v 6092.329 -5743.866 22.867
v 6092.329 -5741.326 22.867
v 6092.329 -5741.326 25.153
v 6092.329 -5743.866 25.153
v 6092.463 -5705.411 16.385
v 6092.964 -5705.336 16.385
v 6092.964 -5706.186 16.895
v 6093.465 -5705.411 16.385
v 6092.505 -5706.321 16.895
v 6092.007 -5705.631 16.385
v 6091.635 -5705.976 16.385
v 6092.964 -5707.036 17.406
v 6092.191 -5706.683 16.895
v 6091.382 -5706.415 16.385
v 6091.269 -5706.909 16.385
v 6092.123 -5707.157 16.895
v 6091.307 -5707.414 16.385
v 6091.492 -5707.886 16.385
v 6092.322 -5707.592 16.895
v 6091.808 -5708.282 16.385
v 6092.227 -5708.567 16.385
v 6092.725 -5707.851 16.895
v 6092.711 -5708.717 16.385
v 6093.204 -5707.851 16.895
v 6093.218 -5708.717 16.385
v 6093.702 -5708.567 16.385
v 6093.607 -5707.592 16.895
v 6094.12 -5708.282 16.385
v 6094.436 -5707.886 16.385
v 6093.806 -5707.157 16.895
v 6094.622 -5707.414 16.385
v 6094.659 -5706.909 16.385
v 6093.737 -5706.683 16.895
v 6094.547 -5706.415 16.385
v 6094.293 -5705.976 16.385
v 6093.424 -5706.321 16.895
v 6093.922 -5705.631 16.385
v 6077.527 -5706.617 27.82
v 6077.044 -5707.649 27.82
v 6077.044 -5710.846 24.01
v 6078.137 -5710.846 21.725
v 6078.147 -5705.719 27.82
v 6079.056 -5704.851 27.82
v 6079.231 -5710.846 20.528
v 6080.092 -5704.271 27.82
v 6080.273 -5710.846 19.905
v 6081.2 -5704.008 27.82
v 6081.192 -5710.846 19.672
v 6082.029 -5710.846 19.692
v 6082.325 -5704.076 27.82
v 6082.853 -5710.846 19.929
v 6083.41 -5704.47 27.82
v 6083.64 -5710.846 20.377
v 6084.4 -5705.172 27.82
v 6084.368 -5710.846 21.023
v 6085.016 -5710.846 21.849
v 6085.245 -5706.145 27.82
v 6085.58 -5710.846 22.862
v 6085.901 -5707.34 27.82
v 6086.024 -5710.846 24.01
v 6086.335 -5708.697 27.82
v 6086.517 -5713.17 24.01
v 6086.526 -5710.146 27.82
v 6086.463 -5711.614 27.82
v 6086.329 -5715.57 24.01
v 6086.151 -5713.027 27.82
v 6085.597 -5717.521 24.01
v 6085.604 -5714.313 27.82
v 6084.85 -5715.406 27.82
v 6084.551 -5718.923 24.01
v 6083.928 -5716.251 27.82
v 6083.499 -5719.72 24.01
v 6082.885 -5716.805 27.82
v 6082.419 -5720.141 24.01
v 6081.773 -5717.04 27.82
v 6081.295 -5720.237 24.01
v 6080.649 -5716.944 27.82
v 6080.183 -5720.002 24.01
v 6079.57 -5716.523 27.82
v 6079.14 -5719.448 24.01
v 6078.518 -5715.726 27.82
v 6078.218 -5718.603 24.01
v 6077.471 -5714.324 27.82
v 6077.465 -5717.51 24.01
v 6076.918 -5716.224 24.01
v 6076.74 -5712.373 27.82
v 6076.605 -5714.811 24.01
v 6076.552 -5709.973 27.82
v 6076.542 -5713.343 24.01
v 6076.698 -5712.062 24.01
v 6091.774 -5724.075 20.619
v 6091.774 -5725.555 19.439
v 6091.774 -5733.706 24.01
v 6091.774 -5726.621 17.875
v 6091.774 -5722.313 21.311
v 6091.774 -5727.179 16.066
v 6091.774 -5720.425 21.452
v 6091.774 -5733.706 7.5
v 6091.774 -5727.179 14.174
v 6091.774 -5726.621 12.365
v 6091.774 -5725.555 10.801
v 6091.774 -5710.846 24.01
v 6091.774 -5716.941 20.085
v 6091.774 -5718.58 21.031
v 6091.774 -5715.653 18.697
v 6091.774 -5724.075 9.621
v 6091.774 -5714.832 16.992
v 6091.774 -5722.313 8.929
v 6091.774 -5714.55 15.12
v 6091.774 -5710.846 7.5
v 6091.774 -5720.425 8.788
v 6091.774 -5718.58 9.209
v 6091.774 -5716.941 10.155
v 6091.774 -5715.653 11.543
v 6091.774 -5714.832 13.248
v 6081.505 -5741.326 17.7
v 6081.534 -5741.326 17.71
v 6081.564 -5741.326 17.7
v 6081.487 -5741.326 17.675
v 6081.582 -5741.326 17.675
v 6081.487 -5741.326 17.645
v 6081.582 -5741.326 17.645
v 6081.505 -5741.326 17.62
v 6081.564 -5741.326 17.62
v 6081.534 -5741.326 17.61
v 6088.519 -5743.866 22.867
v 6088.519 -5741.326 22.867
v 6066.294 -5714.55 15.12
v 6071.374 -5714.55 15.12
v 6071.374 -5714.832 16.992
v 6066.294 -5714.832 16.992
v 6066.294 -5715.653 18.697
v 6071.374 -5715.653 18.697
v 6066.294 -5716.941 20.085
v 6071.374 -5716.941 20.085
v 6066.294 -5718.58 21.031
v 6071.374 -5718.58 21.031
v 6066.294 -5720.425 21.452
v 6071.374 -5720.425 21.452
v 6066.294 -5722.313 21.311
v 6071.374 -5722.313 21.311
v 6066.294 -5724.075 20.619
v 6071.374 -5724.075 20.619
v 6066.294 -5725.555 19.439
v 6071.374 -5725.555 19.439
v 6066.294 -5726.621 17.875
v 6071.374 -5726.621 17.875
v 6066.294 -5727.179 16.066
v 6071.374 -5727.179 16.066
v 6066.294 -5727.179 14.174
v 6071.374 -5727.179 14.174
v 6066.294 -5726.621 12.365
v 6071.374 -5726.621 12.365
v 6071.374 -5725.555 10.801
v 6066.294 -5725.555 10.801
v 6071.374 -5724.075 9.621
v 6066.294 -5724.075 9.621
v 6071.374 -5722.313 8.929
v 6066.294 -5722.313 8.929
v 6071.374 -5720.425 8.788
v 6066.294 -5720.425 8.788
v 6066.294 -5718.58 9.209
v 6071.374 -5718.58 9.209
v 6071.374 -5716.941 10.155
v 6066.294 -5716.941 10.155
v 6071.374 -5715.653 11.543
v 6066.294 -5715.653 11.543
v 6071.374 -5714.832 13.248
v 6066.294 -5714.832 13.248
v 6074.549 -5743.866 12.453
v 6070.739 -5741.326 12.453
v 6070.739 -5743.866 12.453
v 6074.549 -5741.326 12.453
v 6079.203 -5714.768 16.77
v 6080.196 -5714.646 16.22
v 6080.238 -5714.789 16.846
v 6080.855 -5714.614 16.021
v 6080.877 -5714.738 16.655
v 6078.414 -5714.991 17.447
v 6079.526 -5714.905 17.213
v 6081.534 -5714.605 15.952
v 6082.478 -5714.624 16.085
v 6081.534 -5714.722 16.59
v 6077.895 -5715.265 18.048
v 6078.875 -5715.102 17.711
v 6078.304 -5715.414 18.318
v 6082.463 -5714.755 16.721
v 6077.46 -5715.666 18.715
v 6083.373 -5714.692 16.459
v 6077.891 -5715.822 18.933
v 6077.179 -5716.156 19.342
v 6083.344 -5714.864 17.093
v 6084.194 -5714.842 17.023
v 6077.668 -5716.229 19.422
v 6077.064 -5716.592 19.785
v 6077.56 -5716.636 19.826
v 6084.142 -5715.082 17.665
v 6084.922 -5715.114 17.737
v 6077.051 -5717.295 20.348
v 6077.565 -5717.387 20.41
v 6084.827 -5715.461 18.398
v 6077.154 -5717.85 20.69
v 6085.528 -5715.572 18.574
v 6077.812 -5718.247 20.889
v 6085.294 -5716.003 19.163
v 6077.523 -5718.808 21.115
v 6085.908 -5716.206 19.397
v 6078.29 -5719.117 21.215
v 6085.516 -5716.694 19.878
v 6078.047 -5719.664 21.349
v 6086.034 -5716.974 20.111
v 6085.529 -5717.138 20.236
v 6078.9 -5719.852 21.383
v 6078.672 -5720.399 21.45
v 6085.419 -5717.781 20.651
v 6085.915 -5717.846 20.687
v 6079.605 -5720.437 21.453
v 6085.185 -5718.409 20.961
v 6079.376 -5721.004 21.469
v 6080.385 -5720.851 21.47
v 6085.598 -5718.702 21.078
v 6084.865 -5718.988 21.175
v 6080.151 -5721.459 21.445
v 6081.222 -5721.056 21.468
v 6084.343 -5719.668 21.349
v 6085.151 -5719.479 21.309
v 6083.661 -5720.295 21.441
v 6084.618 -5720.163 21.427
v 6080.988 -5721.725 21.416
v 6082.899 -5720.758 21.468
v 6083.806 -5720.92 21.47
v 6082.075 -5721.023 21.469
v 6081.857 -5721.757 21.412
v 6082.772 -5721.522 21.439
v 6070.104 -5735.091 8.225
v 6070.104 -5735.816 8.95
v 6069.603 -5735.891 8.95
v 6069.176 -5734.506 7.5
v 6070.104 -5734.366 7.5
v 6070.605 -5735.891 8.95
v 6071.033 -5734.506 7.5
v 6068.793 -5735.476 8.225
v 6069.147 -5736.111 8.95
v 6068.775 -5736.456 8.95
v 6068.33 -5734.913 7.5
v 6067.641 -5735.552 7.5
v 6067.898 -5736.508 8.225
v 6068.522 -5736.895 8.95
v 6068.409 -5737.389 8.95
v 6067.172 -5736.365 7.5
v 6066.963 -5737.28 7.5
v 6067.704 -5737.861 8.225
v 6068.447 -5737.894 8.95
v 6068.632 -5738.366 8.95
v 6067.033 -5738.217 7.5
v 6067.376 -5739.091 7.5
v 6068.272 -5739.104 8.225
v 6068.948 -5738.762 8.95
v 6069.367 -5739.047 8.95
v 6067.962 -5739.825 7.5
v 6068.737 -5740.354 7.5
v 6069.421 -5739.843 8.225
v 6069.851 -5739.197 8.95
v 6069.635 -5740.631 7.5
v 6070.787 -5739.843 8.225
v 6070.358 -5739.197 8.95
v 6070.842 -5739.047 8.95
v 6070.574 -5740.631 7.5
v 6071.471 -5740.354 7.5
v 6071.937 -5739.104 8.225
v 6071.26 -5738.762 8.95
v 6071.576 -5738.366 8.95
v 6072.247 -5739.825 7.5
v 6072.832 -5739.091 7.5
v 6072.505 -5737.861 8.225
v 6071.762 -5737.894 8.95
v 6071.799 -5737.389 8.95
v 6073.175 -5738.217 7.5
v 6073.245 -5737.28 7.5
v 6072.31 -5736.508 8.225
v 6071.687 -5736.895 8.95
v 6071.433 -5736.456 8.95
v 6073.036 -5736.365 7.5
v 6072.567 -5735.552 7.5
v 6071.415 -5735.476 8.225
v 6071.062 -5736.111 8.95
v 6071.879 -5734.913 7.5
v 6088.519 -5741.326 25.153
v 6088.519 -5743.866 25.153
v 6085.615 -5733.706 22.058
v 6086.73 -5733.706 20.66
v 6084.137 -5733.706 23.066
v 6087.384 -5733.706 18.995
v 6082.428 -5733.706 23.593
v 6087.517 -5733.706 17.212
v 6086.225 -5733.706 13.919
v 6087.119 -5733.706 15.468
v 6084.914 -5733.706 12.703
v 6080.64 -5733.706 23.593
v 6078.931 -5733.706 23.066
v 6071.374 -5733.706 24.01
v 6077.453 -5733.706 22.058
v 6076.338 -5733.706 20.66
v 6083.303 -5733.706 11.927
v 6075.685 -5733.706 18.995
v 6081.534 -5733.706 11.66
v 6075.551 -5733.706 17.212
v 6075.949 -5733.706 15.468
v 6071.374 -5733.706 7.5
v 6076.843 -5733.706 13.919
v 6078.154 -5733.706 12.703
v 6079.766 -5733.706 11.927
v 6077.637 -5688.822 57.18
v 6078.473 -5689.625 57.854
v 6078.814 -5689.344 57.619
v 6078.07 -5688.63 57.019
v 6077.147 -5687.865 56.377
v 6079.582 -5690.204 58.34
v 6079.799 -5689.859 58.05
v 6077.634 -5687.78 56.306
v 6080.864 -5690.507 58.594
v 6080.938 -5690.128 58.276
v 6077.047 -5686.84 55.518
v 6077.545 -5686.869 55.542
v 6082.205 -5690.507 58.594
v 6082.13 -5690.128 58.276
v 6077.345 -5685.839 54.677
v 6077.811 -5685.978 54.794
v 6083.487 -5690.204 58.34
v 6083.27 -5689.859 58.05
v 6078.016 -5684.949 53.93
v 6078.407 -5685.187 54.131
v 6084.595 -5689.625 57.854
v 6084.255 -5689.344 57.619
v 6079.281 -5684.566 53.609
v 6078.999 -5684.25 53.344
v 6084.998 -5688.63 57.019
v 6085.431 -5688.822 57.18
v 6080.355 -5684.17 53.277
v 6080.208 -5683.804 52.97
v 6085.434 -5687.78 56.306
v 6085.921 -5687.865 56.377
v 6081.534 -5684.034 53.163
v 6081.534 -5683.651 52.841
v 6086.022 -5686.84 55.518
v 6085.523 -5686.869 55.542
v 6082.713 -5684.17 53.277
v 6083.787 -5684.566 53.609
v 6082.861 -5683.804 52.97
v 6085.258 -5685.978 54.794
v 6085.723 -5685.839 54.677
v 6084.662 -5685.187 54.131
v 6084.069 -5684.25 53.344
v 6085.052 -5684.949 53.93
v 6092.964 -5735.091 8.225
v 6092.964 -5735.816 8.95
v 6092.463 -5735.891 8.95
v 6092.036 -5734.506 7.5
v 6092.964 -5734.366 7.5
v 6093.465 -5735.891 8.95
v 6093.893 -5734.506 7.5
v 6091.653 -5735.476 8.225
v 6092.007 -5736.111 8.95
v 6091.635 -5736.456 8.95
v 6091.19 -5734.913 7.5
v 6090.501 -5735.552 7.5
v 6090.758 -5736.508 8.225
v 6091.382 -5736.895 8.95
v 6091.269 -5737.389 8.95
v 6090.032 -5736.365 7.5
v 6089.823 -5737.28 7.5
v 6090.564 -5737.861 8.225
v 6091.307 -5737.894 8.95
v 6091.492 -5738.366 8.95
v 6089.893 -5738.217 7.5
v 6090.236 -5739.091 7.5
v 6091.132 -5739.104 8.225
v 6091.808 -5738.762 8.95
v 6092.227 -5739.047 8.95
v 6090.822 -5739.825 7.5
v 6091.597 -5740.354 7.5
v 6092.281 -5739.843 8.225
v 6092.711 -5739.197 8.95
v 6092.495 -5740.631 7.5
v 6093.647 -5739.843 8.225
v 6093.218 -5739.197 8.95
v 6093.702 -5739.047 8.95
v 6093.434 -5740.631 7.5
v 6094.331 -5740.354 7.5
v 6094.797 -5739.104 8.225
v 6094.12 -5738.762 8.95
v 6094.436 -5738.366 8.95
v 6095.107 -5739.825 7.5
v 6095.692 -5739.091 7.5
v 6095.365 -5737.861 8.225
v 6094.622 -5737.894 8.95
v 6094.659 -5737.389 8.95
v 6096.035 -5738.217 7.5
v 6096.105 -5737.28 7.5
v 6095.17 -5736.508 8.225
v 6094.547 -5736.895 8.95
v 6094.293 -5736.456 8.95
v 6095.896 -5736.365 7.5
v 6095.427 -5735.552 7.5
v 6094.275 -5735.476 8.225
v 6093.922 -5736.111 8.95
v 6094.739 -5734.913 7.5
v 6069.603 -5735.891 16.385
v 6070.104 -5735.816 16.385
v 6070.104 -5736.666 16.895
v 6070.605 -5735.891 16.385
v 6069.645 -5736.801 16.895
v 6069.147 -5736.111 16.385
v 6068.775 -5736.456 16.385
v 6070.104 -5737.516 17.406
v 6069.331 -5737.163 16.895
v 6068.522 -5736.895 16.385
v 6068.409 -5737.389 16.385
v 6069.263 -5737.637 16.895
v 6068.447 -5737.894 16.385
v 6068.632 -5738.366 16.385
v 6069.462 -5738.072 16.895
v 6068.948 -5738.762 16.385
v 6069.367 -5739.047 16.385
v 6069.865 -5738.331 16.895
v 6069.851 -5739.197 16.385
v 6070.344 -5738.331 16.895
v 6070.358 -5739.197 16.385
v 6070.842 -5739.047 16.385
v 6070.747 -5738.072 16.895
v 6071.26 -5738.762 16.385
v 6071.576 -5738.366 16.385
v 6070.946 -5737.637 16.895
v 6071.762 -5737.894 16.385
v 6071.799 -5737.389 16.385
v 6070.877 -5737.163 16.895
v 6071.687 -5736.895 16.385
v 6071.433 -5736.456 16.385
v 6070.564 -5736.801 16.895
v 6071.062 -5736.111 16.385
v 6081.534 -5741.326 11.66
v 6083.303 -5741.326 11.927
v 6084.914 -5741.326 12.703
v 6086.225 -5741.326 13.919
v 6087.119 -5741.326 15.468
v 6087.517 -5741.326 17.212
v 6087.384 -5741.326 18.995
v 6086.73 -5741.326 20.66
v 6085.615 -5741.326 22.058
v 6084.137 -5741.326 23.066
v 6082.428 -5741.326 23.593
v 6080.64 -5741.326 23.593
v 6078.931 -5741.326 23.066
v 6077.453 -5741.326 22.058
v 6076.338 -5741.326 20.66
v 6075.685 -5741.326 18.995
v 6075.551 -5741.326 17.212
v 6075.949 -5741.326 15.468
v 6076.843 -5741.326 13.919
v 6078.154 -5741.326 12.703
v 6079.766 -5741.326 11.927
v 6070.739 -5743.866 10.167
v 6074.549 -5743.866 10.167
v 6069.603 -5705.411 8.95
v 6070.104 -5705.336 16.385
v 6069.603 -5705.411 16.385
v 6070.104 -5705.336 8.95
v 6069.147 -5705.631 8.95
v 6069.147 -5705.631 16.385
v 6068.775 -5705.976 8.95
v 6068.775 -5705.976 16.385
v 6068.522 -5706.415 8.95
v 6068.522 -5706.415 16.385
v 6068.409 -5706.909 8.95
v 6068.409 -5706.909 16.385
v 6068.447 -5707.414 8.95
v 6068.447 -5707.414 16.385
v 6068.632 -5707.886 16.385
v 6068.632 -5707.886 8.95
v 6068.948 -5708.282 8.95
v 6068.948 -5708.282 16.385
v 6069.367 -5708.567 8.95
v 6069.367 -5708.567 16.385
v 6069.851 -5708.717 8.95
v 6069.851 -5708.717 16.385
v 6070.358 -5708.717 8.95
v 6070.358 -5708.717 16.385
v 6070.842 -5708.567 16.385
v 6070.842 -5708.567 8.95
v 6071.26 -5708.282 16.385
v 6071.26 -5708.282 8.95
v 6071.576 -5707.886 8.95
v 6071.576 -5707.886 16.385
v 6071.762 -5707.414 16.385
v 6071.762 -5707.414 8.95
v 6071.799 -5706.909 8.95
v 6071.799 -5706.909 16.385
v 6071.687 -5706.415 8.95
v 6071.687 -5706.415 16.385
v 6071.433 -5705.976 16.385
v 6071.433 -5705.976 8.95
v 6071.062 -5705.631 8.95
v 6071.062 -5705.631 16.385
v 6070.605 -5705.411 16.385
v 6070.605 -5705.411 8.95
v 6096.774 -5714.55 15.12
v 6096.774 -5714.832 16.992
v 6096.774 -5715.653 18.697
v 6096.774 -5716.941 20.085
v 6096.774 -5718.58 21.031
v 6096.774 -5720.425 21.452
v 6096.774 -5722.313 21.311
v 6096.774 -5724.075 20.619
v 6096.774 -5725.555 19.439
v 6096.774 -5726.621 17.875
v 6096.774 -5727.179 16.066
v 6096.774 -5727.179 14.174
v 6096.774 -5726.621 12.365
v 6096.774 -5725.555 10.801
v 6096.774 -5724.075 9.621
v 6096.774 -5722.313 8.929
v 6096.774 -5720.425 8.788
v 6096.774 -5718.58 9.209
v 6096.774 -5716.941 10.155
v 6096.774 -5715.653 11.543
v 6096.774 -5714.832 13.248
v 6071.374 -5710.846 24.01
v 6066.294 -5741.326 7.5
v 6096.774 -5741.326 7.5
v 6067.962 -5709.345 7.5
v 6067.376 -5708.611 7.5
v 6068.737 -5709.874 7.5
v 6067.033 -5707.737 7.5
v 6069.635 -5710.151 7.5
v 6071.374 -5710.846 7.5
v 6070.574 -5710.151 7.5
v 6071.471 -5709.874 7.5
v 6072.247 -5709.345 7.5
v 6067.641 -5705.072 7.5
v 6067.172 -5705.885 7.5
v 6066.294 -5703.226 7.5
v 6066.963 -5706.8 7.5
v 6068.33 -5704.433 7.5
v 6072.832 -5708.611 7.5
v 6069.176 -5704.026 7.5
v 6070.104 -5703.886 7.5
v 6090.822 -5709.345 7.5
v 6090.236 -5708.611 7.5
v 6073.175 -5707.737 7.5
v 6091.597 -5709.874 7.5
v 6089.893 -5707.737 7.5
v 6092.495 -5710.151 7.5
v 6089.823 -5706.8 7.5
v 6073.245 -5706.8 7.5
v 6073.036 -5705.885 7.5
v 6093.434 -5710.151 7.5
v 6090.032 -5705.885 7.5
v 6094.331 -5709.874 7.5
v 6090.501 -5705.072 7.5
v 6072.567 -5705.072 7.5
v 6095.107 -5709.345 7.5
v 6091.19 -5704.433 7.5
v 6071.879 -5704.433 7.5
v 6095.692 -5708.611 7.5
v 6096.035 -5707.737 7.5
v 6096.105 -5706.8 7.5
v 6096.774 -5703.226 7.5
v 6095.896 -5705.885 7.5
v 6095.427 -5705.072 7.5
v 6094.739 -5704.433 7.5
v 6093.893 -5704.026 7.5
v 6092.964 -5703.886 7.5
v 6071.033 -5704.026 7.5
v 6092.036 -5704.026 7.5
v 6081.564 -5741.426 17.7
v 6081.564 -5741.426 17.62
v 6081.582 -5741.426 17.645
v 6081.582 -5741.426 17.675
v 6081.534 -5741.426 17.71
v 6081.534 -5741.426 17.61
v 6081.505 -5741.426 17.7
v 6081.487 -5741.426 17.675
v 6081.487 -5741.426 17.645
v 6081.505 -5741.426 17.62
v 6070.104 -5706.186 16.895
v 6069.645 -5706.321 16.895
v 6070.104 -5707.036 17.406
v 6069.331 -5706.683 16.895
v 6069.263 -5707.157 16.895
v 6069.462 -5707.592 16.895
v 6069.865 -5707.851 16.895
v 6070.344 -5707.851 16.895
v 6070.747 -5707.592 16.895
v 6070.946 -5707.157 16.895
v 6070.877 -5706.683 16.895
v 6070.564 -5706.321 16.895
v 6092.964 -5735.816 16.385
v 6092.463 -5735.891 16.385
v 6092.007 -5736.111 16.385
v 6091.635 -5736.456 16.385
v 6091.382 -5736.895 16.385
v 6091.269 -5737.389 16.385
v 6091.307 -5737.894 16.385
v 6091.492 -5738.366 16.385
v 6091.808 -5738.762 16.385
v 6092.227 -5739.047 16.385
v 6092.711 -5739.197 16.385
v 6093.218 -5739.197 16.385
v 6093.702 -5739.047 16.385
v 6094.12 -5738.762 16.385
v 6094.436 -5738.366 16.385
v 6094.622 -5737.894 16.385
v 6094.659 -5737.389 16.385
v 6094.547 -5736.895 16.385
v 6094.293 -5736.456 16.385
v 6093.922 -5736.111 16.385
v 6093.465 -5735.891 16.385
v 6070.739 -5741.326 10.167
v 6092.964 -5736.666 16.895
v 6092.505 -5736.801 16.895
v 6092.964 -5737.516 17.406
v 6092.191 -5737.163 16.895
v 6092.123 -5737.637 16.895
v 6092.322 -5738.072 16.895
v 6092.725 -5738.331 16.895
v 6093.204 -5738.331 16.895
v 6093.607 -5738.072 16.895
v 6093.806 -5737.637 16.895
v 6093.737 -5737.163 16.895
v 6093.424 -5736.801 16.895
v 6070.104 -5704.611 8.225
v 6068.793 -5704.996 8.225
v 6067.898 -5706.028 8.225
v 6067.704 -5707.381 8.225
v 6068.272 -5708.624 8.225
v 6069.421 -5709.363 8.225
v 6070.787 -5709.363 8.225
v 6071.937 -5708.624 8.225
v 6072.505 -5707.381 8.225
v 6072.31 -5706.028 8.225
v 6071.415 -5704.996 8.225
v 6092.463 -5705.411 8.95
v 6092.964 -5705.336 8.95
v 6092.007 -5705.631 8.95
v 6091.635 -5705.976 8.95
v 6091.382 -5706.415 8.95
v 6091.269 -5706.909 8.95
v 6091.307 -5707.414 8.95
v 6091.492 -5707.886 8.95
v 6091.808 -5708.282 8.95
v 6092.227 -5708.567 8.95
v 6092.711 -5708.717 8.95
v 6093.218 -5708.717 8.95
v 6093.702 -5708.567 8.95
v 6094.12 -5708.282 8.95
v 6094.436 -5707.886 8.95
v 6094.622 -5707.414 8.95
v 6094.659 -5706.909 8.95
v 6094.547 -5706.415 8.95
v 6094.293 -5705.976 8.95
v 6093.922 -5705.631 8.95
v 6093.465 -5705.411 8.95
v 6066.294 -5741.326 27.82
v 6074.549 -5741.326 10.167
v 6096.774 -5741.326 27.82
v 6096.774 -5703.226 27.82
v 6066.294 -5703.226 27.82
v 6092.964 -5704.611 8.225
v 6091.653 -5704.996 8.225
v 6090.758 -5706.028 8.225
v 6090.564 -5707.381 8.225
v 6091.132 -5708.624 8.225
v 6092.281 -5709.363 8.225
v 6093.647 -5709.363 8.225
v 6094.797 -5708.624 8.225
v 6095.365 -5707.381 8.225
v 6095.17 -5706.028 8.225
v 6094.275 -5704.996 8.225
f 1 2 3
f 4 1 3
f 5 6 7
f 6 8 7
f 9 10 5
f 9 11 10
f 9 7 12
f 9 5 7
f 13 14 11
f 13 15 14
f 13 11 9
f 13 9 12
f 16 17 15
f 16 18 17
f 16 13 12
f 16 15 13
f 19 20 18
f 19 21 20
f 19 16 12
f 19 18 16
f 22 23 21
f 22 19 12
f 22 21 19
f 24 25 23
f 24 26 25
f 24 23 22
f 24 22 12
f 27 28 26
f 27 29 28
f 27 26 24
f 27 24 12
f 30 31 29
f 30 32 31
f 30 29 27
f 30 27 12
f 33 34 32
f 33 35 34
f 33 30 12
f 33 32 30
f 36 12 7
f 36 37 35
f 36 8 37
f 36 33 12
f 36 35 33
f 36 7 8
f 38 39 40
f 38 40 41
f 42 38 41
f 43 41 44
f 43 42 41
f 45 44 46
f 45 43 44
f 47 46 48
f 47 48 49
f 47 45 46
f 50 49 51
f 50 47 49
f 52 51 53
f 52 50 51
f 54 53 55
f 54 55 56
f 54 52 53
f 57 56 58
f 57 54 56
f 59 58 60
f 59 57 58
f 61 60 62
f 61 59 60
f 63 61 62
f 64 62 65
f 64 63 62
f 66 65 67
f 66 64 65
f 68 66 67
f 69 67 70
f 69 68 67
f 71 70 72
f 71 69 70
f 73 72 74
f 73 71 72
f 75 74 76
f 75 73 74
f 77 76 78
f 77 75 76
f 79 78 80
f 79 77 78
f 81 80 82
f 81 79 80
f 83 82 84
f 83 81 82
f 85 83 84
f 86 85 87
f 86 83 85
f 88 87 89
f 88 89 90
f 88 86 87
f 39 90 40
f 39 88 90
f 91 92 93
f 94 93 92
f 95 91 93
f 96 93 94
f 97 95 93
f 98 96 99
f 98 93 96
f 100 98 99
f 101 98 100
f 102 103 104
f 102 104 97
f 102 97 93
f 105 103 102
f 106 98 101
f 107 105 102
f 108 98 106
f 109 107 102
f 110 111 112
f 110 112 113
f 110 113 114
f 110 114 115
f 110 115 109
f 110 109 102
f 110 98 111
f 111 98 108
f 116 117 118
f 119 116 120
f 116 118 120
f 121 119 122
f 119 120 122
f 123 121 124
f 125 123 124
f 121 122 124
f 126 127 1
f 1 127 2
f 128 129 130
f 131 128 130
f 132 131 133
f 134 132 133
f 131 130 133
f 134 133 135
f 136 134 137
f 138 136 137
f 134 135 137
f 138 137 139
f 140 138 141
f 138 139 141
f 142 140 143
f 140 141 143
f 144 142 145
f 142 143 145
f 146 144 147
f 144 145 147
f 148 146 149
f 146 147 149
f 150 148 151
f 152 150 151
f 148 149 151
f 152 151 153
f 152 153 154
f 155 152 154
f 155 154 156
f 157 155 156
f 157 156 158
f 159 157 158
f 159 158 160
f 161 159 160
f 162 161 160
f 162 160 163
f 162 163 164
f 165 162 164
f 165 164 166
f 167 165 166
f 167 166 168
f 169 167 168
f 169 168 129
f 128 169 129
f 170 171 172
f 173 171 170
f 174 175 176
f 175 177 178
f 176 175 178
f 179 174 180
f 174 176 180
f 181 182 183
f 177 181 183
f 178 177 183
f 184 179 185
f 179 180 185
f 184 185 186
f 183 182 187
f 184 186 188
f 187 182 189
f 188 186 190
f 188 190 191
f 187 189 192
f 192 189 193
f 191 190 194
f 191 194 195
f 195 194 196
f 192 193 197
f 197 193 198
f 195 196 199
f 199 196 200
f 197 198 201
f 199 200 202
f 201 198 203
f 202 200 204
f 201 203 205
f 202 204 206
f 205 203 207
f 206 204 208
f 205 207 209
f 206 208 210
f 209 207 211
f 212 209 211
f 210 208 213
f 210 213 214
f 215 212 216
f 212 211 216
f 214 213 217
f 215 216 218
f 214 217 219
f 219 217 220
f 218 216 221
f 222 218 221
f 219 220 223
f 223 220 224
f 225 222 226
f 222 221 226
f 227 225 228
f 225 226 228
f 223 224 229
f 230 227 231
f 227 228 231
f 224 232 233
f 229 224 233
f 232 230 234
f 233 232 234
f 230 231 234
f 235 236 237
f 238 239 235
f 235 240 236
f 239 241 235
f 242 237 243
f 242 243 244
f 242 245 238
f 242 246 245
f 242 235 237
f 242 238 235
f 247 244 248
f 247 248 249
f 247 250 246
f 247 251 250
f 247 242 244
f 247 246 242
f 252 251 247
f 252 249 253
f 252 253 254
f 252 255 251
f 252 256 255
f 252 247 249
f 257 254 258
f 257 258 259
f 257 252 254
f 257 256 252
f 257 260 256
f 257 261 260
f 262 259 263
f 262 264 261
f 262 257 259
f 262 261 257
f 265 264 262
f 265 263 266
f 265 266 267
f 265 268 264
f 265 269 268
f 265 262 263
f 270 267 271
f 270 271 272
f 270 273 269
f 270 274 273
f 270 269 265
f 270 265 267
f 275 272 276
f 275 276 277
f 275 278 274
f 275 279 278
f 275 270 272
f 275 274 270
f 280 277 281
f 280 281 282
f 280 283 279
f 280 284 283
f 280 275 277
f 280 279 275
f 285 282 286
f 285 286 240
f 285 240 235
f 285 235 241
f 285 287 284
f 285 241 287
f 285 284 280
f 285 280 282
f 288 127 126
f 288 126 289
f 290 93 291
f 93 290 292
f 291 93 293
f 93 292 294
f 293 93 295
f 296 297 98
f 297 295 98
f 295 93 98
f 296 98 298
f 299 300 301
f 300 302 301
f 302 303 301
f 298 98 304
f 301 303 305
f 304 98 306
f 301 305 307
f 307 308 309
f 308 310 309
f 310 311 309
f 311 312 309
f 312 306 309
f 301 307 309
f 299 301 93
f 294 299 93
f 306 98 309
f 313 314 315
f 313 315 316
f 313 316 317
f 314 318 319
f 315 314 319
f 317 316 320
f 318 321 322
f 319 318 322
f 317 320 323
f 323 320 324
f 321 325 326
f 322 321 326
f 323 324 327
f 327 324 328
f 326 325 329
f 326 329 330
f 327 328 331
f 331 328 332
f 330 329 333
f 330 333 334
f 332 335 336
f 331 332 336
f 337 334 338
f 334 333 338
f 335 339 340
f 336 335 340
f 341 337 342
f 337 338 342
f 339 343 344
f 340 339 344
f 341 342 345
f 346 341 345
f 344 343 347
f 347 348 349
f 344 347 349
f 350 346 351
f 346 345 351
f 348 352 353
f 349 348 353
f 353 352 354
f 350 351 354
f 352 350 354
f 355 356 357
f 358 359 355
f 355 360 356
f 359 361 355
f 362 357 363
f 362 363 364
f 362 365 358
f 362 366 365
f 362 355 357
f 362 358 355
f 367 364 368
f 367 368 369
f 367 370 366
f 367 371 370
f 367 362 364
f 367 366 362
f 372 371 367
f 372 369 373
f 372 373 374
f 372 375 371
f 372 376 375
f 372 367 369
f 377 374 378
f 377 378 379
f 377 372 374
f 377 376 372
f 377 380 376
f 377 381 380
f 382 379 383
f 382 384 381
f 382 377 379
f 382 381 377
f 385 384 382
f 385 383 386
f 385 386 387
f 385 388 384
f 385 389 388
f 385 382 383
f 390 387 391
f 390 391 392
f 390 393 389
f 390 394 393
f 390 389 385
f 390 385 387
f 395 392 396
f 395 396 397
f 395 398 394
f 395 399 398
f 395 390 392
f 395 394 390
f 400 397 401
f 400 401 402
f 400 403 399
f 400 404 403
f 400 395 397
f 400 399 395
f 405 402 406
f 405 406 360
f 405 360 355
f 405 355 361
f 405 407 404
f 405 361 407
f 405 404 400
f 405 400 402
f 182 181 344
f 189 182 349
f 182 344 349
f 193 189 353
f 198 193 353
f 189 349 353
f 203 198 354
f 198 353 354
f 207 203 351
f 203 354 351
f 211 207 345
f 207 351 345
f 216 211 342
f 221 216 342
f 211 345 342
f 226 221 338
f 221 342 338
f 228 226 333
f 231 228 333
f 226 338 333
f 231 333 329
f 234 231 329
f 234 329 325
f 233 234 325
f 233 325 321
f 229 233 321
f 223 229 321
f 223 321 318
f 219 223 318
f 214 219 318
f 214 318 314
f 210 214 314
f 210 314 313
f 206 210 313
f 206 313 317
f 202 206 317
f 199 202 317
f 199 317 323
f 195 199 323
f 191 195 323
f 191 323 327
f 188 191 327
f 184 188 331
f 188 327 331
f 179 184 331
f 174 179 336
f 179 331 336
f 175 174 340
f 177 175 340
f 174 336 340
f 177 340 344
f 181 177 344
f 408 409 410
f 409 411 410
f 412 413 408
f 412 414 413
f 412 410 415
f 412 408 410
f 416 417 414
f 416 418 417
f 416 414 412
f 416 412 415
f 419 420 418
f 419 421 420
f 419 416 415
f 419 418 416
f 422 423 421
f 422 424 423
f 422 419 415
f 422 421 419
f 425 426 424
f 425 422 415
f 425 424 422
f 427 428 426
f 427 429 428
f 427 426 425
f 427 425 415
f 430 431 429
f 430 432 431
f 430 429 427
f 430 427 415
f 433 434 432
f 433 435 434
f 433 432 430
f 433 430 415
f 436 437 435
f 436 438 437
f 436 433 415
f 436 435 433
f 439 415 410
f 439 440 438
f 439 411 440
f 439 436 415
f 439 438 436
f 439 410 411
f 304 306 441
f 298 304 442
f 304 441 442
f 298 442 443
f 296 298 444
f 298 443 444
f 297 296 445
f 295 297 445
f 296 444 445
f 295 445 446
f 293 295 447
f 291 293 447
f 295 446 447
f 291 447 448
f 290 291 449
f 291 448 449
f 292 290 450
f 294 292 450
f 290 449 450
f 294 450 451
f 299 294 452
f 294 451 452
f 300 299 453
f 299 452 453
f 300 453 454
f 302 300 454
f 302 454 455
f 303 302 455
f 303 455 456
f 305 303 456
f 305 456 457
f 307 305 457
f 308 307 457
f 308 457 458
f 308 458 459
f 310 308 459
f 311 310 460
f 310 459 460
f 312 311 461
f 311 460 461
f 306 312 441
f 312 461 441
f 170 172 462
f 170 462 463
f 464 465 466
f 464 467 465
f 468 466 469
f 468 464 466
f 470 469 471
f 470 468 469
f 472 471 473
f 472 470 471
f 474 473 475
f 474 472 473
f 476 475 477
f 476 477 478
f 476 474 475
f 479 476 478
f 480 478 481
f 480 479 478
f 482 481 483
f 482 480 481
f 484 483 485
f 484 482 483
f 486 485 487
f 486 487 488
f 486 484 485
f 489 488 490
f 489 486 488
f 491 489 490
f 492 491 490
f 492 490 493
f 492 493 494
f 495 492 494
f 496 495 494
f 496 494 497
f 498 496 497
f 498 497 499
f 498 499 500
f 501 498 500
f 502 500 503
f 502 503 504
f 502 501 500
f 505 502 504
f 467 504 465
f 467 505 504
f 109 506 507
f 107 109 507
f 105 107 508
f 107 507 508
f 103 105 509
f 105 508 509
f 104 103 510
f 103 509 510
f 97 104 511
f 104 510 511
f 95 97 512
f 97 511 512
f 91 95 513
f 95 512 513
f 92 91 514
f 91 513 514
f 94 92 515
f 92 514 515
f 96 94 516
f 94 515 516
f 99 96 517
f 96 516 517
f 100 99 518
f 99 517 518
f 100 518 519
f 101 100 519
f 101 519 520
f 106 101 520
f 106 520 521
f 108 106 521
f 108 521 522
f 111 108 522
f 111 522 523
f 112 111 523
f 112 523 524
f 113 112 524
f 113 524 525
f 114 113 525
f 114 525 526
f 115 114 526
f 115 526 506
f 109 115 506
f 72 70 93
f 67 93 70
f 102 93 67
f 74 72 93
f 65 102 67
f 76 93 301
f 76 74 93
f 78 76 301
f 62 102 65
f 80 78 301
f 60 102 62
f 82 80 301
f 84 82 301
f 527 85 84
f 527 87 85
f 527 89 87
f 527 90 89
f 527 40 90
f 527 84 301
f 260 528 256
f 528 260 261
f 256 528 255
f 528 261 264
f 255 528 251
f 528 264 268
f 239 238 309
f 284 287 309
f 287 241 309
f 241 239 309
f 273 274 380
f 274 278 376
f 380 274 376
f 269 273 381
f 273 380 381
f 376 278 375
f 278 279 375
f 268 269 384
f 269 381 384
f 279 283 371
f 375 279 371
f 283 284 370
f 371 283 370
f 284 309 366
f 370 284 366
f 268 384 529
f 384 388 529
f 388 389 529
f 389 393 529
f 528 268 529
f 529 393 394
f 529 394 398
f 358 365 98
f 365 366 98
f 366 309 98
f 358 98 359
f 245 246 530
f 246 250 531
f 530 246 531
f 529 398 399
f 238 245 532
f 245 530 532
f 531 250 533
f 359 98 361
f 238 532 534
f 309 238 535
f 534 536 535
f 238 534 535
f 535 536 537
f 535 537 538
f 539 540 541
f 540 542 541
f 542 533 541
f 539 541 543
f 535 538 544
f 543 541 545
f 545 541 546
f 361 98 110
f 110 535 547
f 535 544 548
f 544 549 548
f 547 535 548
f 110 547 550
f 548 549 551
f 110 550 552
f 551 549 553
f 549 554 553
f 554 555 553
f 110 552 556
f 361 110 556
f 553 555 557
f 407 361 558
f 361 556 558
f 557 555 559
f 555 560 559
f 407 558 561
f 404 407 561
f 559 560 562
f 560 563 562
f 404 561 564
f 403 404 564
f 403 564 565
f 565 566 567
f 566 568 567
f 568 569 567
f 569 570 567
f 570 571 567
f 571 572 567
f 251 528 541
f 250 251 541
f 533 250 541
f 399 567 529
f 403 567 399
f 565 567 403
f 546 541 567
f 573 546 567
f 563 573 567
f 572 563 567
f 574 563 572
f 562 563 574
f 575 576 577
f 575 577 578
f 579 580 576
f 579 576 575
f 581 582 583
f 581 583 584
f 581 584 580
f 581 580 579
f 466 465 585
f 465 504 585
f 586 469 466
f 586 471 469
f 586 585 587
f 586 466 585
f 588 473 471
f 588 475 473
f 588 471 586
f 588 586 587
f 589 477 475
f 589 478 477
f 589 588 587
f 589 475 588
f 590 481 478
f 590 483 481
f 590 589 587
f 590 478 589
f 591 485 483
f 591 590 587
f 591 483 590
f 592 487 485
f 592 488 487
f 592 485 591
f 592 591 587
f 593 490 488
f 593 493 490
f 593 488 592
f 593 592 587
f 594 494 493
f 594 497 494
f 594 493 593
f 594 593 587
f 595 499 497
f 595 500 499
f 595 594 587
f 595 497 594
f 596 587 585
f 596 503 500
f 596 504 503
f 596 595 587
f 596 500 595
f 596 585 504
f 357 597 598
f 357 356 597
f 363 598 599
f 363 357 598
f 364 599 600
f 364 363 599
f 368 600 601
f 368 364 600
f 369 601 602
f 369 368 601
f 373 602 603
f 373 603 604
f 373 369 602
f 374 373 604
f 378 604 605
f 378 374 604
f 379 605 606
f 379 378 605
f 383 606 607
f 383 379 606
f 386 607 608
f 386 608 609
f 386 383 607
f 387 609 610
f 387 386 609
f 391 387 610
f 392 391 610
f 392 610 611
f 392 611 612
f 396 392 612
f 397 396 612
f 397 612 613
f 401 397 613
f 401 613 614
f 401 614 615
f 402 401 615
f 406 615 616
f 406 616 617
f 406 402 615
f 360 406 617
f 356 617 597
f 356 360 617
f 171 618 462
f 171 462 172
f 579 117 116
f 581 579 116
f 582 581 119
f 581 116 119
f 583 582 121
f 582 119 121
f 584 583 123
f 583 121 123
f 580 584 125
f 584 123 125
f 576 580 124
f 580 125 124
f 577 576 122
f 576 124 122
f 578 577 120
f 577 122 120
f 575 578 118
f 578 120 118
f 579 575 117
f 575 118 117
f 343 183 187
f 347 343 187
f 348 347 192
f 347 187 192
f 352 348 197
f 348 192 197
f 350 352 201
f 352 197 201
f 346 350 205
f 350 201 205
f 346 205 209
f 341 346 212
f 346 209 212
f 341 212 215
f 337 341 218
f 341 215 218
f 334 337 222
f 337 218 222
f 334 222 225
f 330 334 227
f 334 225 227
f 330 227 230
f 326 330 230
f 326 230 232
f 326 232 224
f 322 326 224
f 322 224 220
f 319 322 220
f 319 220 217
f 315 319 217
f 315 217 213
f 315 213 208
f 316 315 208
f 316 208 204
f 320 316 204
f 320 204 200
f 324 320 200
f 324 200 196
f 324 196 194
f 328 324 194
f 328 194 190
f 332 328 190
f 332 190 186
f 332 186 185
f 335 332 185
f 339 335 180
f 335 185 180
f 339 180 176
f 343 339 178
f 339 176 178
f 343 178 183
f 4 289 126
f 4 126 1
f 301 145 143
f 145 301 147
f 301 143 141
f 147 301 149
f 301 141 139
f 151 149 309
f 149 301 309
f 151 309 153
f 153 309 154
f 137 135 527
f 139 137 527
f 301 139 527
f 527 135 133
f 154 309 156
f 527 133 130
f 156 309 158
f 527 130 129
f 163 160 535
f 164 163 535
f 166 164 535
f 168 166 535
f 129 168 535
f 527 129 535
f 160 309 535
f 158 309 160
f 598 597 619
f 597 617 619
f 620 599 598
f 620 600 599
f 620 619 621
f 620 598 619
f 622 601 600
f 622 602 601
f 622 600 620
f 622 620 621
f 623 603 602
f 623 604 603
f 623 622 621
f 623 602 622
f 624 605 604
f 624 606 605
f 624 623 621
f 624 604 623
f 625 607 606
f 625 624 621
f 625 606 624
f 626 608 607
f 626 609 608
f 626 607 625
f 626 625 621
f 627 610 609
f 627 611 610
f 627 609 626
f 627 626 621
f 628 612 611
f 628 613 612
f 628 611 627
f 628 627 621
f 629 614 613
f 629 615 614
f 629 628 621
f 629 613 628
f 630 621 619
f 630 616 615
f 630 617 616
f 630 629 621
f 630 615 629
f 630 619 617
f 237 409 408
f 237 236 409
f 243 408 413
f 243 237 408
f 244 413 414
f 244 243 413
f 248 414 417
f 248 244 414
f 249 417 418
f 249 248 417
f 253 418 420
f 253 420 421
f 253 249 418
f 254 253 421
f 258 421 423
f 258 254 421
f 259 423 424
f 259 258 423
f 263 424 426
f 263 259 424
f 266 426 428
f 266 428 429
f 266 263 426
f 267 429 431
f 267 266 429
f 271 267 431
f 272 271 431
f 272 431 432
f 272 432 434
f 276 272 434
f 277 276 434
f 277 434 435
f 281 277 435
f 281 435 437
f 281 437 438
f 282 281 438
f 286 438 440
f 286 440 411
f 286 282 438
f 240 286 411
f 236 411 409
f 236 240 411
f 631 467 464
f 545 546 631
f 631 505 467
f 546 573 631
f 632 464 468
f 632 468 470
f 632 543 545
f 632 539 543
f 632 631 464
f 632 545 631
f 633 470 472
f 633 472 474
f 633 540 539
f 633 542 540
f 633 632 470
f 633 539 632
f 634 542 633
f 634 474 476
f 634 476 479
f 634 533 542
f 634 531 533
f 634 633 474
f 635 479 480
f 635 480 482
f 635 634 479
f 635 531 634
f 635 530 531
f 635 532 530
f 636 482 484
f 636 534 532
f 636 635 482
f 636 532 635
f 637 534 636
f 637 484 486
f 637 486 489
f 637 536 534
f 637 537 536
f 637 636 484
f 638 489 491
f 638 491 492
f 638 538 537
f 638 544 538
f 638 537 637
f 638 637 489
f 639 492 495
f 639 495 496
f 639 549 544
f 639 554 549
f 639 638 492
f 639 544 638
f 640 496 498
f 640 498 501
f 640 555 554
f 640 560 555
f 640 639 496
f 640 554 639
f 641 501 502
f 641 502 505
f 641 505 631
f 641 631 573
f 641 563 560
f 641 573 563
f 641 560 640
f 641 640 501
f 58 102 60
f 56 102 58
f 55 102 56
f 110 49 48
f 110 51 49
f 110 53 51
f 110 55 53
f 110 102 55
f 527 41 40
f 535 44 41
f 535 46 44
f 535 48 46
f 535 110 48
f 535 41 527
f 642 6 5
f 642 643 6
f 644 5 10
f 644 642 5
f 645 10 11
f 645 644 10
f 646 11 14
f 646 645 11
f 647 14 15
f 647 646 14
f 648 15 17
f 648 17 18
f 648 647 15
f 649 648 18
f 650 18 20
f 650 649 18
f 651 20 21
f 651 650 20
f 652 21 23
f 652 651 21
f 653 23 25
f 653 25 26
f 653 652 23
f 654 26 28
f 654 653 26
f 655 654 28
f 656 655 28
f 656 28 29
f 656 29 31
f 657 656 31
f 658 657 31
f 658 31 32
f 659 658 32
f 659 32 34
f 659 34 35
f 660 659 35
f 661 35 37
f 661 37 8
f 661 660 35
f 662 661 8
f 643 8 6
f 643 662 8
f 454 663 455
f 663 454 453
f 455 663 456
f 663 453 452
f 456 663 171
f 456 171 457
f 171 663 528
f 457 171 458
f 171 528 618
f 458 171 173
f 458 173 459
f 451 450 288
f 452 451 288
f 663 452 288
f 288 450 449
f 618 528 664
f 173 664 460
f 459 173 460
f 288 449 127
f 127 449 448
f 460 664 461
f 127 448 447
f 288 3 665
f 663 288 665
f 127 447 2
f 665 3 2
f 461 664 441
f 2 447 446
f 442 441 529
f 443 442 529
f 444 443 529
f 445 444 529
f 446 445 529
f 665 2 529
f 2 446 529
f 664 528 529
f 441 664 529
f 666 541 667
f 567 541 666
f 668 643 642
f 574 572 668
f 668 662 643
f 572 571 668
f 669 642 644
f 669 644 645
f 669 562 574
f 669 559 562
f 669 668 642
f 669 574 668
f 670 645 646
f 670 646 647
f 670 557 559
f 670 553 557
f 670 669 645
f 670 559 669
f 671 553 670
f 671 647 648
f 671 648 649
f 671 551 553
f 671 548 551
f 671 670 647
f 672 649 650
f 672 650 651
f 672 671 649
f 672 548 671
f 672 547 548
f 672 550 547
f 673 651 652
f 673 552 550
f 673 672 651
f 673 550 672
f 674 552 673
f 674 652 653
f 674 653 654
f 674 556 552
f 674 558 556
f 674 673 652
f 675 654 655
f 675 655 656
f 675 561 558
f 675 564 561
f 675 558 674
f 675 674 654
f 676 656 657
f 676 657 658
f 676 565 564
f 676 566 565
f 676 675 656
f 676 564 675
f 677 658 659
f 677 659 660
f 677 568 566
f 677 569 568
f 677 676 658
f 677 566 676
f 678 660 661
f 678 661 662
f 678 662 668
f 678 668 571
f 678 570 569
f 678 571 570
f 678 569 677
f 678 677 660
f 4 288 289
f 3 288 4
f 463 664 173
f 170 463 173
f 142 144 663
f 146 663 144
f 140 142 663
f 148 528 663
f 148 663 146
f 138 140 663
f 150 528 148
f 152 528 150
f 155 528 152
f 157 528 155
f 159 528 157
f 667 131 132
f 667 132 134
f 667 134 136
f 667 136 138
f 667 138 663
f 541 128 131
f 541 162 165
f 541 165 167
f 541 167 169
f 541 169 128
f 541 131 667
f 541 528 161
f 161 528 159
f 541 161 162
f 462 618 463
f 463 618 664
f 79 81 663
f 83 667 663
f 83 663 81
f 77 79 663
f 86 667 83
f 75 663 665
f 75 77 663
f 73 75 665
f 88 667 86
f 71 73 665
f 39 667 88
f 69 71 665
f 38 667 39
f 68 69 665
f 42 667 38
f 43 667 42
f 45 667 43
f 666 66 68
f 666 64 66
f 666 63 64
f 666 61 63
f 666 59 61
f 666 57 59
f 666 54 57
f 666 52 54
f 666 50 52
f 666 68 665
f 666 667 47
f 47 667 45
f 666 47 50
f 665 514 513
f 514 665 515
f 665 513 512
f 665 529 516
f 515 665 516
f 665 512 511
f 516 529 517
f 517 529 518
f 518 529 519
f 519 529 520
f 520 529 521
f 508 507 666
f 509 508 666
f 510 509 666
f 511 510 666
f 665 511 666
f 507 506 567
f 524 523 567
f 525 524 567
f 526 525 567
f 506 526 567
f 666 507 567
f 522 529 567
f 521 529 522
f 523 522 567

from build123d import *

# Parameters (mm, degrees)
BOSS_EXTRUDE1_START                            = 7.5
SKETCH1_W                                      = 30.48
SKETCH1_H                                      = 38.1
BOSS_EXTRUDE1_DEPTH                            = 20.32
SKETCH2_W                                      = 20.4
SKETCH2_H                                      = 22.86
CUT_EXTRUDE1_DEPTH                             = 16.51
SKETCH5_R                                      = 5
CUT_EXTRUDE2_DEPTH                             = 23
BOSS_EXTRUDE2_DEPTH                            = 21.59
BOSS_EXTRUDE2_DEPTH_BACK                       = 31.75
SKETCH10_R                                     = 4.5
SKETCH11_R                                     = 4
CUT_EXTRUDE6_DEPTH                             = 7540.718926849
CSK_FOR_M3_FLAT_HEAD_MACHINE_SCREW1_AT_2_COUNT = 2
CSK_FOR_M3_FLAT_HEAD_MACHINE_SCREW1_AT_2_PITCH = 22.86
CSK_FOR_M3_FLAT_HEAD_MACHINE_SCREW1_AT_3_COUNT = 2
CSK_FOR_M3_FLAT_HEAD_MACHINE_SCREW1_AT_3_PITCH = 38.1
CSK_FOR_M3_FLAT_HEAD_MACHINE_SCREW1_AT_4_COUNT = 2
CSK_FOR_M3_FLAT_HEAD_MACHINE_SCREW1_AT_4_PITCH = 30.48
SKETCH17_R                                     = 6.35
CUT_EXTRUDE7_DEPTH                             = 5742.70602656
SKETCH19_R                                     = 0.05
BOSS_EXTRUDE3_DEPTH                            = 0.1
SKETCH29_R                                     = 6
CUT_EXTRUDE8_DEPTH                             = 7.62
SKETCH30_W                                     = 3.81
SKETCH30_H                                     = 2.286
BOSS_EXTRUDE4_DEPTH                            = 2.54


with BuildPart() as part:
    # Sketch1 → Boss-Extrude1 (new body)
    with BuildSketch(Plane.XY.offset(BOSS_EXTRUDE1_START)):
        with Locations((6081.534193548, -5722.275806452)):
            Rectangle(SKETCH1_W, SKETCH1_H)
    extrude(amount=BOSS_EXTRUDE1_DEPTH)

    # Sketch2 → Cut-Extrude1 (cut)
    with BuildSketch(Plane(origin=(0, 0, 7.5), x_dir=(-1, 0, 0), z_dir=(0, 0, -1))):
        with Locations((-6081.574193548, -5722.275806452)):
            Rectangle(SKETCH2_W, SKETCH2_H)
    extrude(amount=-CUT_EXTRUDE1_DEPTH, mode=Mode.SUBTRACT)

    # Sketch5 → Cut-Extrude2 (cut)
    with BuildSketch(Plane(origin=(0, -2342.736843325, -2791.965049535), x_dir=(-1, 0, 0), z_dir=(0, -0.6427876096865405, -0.766044443118977))):
        with Locations(Location((-6081.534193548, -4392.394788186, 0), (0, 0, 26.10084585))):
            Circle(SKETCH5_R)
    extrude(amount=CUT_EXTRUDE2_DEPTH, mode=Mode.SUBTRACT)

    # Sketch14 → CSK for M3 Flat Head Machine Screw1 (revolve, cut)
    with BuildSketch(Plane(origin=(6092.964193548, -5707.035806452, 7.5), x_dir=(0, 1, 0), z_dir=(1, 0, 0))):
        Polygon((0, 0), (0, 9.906), (1.7, 8.884536948), (1.7, 1.45), (3.15, 0), align=None)
    csk_for_m3_flat_head_machine_screw1 = revolve(axis=Axis((6092.964193548, -5707.035806452, 1.15), (0, 0, 1)), mode=Mode.SUBTRACT)

    # CSK for M3 Flat Head Machine Screw1 at 2: CSK for M3 Flat Head Machine Screw1 ×2
    with Locations(*[(-i * CSK_FOR_M3_FLAT_HEAD_MACHINE_SCREW1_AT_2_PITCH, 0, 0) for i in range(1, CSK_FOR_M3_FLAT_HEAD_MACHINE_SCREW1_AT_2_COUNT)]):
        add(csk_for_m3_flat_head_machine_screw1, mode=Mode.SUBTRACT)

    # CSK for M3 Flat Head Machine Screw1 at 3: CSK for M3 Flat Head Machine Screw1 ×2
    with Locations(*[Vector(-0.5999999999999771, -0.8000000000000171, 0) * (i * CSK_FOR_M3_FLAT_HEAD_MACHINE_SCREW1_AT_3_PITCH) for i in range(1, CSK_FOR_M3_FLAT_HEAD_MACHINE_SCREW1_AT_3_COUNT)]):
        add(csk_for_m3_flat_head_machine_screw1, mode=Mode.SUBTRACT)

    # CSK for M3 Flat Head Machine Screw1 at 4: CSK for M3 Flat Head Machine Screw1 ×2
    with Locations(*[(0, -i * CSK_FOR_M3_FLAT_HEAD_MACHINE_SCREW1_AT_4_PITCH, 0) for i in range(1, CSK_FOR_M3_FLAT_HEAD_MACHINE_SCREW1_AT_4_COUNT)]):
        add(csk_for_m3_flat_head_machine_screw1, mode=Mode.SUBTRACT)


with BuildPart() as body_2:
    # Sketch10 → Boss-Extrude2 (new, two sides: drawn at the far end of the back side and taken through both)
    with BuildSketch(Plane(origin=(0, -2342.736843325, -2791.965049535), x_dir=(-1, 0, 0), z_dir=(0, -0.6427876096865405, -0.766044443118977)).offset(-BOSS_EXTRUDE2_DEPTH_BACK)):
        with Locations(Location((-6081.534193548, -4392.394788186, 0), (0, 0, 90))):
            Circle(SKETCH10_R)
    extrude(amount=BOSS_EXTRUDE2_DEPTH + BOSS_EXTRUDE2_DEPTH_BACK)

    # Sketch11 → Cut-Extrude6 (cut, through all)
    with BuildSketch(Plane(origin=(0, -2356.614627818, -2808.503949062), x_dir=(1, 0, 0), z_dir=(0, -0.6427876096865406, -0.766044443118977))):
        with Locations(Location((6081.534193548, 4392.394788186, 0), (0, 0, 270))):
            Circle(SKETCH11_R)
    extrude(amount=-CUT_EXTRUDE6_DEPTH, mode=Mode.SUBTRACT)


with BuildPart() as cut_extrude7_tool:
    # Sketch17 → Cut-Extrude7 (new, through all)
    with BuildSketch(Plane(origin=(6096.774193549, 0, 0), x_dir=(0, 0, -1), z_dir=(1, 0, 0))):
        with Locations(Location((-15.12, -5720.899791669, 0), (0, 0, 90))):
            Circle(SKETCH17_R)
    extrude(amount=-CUT_EXTRUDE7_DEPTH)


with BuildPart() as part_1:
    add(part.part)

    # Cut-Extrude7: cut by cut_extrude7_tool
    add(cut_extrude7_tool.part, mode=Mode.SUBTRACT)

    # Sketch19 → Boss-Extrude3 (add)
    with BuildSketch(Plane.XZ.offset(5741.325806452)):
        with Locations(Location((6081.534193548, 17.66, 0), (0, 0, 89.999999995))):
            Circle(SKETCH19_R)
    extrude(amount=BOSS_EXTRUDE3_DEPTH)

    # Sketch29 → Cut-Extrude8 (cut)
    with BuildSketch(Plane.XZ.offset(5741.325806452)):
        with Locations(Location((6081.534193548, 17.66, 0), (0, 0, 270))):
            Circle(SKETCH29_R)
    extrude(amount=-CUT_EXTRUDE8_DEPTH, mode=Mode.SUBTRACT)


with BuildPart() as body_2_1:
    add(body_2.part)

    # Cut-Extrude7: cut by cut_extrude7_tool
    add(cut_extrude7_tool.part, mode=Mode.SUBTRACT)


with BuildPart() as cut_extrude8_piece_1:
    # of the separate pieces the step leaves, piece 1, a body of its own (cut_extrude8_pieces)
    add(part_1.part.solids().sort_by_distance((6066.294193548, -5703.225806452, 7.5))[0])

    # Sketch30 → Boss-Extrude4 (add)
    with BuildSketch(Plane.XZ.offset(5741.325806452)):
        with Locations((6090.424193548, 24.01)):
            Rectangle(SKETCH30_W, SKETCH30_H)
        with Locations((6072.644193548, 11.31)):
            Rectangle(SKETCH30_W, SKETCH30_H)
    extrude(amount=BOSS_EXTRUDE4_DEPTH)


with BuildPart() as cut_extrude8_piece_2:
    # of the separate pieces the step leaves, piece 2, a body of its own (cut_extrude8_pieces)
    add(part_1.part.solids().sort_by_distance((6081.534193548, -5741.325806452, 17.71))[0])


solid = Compound([body_2_1.part, cut_extrude8_piece_1.part, cut_extrude8_piece_2.part])
